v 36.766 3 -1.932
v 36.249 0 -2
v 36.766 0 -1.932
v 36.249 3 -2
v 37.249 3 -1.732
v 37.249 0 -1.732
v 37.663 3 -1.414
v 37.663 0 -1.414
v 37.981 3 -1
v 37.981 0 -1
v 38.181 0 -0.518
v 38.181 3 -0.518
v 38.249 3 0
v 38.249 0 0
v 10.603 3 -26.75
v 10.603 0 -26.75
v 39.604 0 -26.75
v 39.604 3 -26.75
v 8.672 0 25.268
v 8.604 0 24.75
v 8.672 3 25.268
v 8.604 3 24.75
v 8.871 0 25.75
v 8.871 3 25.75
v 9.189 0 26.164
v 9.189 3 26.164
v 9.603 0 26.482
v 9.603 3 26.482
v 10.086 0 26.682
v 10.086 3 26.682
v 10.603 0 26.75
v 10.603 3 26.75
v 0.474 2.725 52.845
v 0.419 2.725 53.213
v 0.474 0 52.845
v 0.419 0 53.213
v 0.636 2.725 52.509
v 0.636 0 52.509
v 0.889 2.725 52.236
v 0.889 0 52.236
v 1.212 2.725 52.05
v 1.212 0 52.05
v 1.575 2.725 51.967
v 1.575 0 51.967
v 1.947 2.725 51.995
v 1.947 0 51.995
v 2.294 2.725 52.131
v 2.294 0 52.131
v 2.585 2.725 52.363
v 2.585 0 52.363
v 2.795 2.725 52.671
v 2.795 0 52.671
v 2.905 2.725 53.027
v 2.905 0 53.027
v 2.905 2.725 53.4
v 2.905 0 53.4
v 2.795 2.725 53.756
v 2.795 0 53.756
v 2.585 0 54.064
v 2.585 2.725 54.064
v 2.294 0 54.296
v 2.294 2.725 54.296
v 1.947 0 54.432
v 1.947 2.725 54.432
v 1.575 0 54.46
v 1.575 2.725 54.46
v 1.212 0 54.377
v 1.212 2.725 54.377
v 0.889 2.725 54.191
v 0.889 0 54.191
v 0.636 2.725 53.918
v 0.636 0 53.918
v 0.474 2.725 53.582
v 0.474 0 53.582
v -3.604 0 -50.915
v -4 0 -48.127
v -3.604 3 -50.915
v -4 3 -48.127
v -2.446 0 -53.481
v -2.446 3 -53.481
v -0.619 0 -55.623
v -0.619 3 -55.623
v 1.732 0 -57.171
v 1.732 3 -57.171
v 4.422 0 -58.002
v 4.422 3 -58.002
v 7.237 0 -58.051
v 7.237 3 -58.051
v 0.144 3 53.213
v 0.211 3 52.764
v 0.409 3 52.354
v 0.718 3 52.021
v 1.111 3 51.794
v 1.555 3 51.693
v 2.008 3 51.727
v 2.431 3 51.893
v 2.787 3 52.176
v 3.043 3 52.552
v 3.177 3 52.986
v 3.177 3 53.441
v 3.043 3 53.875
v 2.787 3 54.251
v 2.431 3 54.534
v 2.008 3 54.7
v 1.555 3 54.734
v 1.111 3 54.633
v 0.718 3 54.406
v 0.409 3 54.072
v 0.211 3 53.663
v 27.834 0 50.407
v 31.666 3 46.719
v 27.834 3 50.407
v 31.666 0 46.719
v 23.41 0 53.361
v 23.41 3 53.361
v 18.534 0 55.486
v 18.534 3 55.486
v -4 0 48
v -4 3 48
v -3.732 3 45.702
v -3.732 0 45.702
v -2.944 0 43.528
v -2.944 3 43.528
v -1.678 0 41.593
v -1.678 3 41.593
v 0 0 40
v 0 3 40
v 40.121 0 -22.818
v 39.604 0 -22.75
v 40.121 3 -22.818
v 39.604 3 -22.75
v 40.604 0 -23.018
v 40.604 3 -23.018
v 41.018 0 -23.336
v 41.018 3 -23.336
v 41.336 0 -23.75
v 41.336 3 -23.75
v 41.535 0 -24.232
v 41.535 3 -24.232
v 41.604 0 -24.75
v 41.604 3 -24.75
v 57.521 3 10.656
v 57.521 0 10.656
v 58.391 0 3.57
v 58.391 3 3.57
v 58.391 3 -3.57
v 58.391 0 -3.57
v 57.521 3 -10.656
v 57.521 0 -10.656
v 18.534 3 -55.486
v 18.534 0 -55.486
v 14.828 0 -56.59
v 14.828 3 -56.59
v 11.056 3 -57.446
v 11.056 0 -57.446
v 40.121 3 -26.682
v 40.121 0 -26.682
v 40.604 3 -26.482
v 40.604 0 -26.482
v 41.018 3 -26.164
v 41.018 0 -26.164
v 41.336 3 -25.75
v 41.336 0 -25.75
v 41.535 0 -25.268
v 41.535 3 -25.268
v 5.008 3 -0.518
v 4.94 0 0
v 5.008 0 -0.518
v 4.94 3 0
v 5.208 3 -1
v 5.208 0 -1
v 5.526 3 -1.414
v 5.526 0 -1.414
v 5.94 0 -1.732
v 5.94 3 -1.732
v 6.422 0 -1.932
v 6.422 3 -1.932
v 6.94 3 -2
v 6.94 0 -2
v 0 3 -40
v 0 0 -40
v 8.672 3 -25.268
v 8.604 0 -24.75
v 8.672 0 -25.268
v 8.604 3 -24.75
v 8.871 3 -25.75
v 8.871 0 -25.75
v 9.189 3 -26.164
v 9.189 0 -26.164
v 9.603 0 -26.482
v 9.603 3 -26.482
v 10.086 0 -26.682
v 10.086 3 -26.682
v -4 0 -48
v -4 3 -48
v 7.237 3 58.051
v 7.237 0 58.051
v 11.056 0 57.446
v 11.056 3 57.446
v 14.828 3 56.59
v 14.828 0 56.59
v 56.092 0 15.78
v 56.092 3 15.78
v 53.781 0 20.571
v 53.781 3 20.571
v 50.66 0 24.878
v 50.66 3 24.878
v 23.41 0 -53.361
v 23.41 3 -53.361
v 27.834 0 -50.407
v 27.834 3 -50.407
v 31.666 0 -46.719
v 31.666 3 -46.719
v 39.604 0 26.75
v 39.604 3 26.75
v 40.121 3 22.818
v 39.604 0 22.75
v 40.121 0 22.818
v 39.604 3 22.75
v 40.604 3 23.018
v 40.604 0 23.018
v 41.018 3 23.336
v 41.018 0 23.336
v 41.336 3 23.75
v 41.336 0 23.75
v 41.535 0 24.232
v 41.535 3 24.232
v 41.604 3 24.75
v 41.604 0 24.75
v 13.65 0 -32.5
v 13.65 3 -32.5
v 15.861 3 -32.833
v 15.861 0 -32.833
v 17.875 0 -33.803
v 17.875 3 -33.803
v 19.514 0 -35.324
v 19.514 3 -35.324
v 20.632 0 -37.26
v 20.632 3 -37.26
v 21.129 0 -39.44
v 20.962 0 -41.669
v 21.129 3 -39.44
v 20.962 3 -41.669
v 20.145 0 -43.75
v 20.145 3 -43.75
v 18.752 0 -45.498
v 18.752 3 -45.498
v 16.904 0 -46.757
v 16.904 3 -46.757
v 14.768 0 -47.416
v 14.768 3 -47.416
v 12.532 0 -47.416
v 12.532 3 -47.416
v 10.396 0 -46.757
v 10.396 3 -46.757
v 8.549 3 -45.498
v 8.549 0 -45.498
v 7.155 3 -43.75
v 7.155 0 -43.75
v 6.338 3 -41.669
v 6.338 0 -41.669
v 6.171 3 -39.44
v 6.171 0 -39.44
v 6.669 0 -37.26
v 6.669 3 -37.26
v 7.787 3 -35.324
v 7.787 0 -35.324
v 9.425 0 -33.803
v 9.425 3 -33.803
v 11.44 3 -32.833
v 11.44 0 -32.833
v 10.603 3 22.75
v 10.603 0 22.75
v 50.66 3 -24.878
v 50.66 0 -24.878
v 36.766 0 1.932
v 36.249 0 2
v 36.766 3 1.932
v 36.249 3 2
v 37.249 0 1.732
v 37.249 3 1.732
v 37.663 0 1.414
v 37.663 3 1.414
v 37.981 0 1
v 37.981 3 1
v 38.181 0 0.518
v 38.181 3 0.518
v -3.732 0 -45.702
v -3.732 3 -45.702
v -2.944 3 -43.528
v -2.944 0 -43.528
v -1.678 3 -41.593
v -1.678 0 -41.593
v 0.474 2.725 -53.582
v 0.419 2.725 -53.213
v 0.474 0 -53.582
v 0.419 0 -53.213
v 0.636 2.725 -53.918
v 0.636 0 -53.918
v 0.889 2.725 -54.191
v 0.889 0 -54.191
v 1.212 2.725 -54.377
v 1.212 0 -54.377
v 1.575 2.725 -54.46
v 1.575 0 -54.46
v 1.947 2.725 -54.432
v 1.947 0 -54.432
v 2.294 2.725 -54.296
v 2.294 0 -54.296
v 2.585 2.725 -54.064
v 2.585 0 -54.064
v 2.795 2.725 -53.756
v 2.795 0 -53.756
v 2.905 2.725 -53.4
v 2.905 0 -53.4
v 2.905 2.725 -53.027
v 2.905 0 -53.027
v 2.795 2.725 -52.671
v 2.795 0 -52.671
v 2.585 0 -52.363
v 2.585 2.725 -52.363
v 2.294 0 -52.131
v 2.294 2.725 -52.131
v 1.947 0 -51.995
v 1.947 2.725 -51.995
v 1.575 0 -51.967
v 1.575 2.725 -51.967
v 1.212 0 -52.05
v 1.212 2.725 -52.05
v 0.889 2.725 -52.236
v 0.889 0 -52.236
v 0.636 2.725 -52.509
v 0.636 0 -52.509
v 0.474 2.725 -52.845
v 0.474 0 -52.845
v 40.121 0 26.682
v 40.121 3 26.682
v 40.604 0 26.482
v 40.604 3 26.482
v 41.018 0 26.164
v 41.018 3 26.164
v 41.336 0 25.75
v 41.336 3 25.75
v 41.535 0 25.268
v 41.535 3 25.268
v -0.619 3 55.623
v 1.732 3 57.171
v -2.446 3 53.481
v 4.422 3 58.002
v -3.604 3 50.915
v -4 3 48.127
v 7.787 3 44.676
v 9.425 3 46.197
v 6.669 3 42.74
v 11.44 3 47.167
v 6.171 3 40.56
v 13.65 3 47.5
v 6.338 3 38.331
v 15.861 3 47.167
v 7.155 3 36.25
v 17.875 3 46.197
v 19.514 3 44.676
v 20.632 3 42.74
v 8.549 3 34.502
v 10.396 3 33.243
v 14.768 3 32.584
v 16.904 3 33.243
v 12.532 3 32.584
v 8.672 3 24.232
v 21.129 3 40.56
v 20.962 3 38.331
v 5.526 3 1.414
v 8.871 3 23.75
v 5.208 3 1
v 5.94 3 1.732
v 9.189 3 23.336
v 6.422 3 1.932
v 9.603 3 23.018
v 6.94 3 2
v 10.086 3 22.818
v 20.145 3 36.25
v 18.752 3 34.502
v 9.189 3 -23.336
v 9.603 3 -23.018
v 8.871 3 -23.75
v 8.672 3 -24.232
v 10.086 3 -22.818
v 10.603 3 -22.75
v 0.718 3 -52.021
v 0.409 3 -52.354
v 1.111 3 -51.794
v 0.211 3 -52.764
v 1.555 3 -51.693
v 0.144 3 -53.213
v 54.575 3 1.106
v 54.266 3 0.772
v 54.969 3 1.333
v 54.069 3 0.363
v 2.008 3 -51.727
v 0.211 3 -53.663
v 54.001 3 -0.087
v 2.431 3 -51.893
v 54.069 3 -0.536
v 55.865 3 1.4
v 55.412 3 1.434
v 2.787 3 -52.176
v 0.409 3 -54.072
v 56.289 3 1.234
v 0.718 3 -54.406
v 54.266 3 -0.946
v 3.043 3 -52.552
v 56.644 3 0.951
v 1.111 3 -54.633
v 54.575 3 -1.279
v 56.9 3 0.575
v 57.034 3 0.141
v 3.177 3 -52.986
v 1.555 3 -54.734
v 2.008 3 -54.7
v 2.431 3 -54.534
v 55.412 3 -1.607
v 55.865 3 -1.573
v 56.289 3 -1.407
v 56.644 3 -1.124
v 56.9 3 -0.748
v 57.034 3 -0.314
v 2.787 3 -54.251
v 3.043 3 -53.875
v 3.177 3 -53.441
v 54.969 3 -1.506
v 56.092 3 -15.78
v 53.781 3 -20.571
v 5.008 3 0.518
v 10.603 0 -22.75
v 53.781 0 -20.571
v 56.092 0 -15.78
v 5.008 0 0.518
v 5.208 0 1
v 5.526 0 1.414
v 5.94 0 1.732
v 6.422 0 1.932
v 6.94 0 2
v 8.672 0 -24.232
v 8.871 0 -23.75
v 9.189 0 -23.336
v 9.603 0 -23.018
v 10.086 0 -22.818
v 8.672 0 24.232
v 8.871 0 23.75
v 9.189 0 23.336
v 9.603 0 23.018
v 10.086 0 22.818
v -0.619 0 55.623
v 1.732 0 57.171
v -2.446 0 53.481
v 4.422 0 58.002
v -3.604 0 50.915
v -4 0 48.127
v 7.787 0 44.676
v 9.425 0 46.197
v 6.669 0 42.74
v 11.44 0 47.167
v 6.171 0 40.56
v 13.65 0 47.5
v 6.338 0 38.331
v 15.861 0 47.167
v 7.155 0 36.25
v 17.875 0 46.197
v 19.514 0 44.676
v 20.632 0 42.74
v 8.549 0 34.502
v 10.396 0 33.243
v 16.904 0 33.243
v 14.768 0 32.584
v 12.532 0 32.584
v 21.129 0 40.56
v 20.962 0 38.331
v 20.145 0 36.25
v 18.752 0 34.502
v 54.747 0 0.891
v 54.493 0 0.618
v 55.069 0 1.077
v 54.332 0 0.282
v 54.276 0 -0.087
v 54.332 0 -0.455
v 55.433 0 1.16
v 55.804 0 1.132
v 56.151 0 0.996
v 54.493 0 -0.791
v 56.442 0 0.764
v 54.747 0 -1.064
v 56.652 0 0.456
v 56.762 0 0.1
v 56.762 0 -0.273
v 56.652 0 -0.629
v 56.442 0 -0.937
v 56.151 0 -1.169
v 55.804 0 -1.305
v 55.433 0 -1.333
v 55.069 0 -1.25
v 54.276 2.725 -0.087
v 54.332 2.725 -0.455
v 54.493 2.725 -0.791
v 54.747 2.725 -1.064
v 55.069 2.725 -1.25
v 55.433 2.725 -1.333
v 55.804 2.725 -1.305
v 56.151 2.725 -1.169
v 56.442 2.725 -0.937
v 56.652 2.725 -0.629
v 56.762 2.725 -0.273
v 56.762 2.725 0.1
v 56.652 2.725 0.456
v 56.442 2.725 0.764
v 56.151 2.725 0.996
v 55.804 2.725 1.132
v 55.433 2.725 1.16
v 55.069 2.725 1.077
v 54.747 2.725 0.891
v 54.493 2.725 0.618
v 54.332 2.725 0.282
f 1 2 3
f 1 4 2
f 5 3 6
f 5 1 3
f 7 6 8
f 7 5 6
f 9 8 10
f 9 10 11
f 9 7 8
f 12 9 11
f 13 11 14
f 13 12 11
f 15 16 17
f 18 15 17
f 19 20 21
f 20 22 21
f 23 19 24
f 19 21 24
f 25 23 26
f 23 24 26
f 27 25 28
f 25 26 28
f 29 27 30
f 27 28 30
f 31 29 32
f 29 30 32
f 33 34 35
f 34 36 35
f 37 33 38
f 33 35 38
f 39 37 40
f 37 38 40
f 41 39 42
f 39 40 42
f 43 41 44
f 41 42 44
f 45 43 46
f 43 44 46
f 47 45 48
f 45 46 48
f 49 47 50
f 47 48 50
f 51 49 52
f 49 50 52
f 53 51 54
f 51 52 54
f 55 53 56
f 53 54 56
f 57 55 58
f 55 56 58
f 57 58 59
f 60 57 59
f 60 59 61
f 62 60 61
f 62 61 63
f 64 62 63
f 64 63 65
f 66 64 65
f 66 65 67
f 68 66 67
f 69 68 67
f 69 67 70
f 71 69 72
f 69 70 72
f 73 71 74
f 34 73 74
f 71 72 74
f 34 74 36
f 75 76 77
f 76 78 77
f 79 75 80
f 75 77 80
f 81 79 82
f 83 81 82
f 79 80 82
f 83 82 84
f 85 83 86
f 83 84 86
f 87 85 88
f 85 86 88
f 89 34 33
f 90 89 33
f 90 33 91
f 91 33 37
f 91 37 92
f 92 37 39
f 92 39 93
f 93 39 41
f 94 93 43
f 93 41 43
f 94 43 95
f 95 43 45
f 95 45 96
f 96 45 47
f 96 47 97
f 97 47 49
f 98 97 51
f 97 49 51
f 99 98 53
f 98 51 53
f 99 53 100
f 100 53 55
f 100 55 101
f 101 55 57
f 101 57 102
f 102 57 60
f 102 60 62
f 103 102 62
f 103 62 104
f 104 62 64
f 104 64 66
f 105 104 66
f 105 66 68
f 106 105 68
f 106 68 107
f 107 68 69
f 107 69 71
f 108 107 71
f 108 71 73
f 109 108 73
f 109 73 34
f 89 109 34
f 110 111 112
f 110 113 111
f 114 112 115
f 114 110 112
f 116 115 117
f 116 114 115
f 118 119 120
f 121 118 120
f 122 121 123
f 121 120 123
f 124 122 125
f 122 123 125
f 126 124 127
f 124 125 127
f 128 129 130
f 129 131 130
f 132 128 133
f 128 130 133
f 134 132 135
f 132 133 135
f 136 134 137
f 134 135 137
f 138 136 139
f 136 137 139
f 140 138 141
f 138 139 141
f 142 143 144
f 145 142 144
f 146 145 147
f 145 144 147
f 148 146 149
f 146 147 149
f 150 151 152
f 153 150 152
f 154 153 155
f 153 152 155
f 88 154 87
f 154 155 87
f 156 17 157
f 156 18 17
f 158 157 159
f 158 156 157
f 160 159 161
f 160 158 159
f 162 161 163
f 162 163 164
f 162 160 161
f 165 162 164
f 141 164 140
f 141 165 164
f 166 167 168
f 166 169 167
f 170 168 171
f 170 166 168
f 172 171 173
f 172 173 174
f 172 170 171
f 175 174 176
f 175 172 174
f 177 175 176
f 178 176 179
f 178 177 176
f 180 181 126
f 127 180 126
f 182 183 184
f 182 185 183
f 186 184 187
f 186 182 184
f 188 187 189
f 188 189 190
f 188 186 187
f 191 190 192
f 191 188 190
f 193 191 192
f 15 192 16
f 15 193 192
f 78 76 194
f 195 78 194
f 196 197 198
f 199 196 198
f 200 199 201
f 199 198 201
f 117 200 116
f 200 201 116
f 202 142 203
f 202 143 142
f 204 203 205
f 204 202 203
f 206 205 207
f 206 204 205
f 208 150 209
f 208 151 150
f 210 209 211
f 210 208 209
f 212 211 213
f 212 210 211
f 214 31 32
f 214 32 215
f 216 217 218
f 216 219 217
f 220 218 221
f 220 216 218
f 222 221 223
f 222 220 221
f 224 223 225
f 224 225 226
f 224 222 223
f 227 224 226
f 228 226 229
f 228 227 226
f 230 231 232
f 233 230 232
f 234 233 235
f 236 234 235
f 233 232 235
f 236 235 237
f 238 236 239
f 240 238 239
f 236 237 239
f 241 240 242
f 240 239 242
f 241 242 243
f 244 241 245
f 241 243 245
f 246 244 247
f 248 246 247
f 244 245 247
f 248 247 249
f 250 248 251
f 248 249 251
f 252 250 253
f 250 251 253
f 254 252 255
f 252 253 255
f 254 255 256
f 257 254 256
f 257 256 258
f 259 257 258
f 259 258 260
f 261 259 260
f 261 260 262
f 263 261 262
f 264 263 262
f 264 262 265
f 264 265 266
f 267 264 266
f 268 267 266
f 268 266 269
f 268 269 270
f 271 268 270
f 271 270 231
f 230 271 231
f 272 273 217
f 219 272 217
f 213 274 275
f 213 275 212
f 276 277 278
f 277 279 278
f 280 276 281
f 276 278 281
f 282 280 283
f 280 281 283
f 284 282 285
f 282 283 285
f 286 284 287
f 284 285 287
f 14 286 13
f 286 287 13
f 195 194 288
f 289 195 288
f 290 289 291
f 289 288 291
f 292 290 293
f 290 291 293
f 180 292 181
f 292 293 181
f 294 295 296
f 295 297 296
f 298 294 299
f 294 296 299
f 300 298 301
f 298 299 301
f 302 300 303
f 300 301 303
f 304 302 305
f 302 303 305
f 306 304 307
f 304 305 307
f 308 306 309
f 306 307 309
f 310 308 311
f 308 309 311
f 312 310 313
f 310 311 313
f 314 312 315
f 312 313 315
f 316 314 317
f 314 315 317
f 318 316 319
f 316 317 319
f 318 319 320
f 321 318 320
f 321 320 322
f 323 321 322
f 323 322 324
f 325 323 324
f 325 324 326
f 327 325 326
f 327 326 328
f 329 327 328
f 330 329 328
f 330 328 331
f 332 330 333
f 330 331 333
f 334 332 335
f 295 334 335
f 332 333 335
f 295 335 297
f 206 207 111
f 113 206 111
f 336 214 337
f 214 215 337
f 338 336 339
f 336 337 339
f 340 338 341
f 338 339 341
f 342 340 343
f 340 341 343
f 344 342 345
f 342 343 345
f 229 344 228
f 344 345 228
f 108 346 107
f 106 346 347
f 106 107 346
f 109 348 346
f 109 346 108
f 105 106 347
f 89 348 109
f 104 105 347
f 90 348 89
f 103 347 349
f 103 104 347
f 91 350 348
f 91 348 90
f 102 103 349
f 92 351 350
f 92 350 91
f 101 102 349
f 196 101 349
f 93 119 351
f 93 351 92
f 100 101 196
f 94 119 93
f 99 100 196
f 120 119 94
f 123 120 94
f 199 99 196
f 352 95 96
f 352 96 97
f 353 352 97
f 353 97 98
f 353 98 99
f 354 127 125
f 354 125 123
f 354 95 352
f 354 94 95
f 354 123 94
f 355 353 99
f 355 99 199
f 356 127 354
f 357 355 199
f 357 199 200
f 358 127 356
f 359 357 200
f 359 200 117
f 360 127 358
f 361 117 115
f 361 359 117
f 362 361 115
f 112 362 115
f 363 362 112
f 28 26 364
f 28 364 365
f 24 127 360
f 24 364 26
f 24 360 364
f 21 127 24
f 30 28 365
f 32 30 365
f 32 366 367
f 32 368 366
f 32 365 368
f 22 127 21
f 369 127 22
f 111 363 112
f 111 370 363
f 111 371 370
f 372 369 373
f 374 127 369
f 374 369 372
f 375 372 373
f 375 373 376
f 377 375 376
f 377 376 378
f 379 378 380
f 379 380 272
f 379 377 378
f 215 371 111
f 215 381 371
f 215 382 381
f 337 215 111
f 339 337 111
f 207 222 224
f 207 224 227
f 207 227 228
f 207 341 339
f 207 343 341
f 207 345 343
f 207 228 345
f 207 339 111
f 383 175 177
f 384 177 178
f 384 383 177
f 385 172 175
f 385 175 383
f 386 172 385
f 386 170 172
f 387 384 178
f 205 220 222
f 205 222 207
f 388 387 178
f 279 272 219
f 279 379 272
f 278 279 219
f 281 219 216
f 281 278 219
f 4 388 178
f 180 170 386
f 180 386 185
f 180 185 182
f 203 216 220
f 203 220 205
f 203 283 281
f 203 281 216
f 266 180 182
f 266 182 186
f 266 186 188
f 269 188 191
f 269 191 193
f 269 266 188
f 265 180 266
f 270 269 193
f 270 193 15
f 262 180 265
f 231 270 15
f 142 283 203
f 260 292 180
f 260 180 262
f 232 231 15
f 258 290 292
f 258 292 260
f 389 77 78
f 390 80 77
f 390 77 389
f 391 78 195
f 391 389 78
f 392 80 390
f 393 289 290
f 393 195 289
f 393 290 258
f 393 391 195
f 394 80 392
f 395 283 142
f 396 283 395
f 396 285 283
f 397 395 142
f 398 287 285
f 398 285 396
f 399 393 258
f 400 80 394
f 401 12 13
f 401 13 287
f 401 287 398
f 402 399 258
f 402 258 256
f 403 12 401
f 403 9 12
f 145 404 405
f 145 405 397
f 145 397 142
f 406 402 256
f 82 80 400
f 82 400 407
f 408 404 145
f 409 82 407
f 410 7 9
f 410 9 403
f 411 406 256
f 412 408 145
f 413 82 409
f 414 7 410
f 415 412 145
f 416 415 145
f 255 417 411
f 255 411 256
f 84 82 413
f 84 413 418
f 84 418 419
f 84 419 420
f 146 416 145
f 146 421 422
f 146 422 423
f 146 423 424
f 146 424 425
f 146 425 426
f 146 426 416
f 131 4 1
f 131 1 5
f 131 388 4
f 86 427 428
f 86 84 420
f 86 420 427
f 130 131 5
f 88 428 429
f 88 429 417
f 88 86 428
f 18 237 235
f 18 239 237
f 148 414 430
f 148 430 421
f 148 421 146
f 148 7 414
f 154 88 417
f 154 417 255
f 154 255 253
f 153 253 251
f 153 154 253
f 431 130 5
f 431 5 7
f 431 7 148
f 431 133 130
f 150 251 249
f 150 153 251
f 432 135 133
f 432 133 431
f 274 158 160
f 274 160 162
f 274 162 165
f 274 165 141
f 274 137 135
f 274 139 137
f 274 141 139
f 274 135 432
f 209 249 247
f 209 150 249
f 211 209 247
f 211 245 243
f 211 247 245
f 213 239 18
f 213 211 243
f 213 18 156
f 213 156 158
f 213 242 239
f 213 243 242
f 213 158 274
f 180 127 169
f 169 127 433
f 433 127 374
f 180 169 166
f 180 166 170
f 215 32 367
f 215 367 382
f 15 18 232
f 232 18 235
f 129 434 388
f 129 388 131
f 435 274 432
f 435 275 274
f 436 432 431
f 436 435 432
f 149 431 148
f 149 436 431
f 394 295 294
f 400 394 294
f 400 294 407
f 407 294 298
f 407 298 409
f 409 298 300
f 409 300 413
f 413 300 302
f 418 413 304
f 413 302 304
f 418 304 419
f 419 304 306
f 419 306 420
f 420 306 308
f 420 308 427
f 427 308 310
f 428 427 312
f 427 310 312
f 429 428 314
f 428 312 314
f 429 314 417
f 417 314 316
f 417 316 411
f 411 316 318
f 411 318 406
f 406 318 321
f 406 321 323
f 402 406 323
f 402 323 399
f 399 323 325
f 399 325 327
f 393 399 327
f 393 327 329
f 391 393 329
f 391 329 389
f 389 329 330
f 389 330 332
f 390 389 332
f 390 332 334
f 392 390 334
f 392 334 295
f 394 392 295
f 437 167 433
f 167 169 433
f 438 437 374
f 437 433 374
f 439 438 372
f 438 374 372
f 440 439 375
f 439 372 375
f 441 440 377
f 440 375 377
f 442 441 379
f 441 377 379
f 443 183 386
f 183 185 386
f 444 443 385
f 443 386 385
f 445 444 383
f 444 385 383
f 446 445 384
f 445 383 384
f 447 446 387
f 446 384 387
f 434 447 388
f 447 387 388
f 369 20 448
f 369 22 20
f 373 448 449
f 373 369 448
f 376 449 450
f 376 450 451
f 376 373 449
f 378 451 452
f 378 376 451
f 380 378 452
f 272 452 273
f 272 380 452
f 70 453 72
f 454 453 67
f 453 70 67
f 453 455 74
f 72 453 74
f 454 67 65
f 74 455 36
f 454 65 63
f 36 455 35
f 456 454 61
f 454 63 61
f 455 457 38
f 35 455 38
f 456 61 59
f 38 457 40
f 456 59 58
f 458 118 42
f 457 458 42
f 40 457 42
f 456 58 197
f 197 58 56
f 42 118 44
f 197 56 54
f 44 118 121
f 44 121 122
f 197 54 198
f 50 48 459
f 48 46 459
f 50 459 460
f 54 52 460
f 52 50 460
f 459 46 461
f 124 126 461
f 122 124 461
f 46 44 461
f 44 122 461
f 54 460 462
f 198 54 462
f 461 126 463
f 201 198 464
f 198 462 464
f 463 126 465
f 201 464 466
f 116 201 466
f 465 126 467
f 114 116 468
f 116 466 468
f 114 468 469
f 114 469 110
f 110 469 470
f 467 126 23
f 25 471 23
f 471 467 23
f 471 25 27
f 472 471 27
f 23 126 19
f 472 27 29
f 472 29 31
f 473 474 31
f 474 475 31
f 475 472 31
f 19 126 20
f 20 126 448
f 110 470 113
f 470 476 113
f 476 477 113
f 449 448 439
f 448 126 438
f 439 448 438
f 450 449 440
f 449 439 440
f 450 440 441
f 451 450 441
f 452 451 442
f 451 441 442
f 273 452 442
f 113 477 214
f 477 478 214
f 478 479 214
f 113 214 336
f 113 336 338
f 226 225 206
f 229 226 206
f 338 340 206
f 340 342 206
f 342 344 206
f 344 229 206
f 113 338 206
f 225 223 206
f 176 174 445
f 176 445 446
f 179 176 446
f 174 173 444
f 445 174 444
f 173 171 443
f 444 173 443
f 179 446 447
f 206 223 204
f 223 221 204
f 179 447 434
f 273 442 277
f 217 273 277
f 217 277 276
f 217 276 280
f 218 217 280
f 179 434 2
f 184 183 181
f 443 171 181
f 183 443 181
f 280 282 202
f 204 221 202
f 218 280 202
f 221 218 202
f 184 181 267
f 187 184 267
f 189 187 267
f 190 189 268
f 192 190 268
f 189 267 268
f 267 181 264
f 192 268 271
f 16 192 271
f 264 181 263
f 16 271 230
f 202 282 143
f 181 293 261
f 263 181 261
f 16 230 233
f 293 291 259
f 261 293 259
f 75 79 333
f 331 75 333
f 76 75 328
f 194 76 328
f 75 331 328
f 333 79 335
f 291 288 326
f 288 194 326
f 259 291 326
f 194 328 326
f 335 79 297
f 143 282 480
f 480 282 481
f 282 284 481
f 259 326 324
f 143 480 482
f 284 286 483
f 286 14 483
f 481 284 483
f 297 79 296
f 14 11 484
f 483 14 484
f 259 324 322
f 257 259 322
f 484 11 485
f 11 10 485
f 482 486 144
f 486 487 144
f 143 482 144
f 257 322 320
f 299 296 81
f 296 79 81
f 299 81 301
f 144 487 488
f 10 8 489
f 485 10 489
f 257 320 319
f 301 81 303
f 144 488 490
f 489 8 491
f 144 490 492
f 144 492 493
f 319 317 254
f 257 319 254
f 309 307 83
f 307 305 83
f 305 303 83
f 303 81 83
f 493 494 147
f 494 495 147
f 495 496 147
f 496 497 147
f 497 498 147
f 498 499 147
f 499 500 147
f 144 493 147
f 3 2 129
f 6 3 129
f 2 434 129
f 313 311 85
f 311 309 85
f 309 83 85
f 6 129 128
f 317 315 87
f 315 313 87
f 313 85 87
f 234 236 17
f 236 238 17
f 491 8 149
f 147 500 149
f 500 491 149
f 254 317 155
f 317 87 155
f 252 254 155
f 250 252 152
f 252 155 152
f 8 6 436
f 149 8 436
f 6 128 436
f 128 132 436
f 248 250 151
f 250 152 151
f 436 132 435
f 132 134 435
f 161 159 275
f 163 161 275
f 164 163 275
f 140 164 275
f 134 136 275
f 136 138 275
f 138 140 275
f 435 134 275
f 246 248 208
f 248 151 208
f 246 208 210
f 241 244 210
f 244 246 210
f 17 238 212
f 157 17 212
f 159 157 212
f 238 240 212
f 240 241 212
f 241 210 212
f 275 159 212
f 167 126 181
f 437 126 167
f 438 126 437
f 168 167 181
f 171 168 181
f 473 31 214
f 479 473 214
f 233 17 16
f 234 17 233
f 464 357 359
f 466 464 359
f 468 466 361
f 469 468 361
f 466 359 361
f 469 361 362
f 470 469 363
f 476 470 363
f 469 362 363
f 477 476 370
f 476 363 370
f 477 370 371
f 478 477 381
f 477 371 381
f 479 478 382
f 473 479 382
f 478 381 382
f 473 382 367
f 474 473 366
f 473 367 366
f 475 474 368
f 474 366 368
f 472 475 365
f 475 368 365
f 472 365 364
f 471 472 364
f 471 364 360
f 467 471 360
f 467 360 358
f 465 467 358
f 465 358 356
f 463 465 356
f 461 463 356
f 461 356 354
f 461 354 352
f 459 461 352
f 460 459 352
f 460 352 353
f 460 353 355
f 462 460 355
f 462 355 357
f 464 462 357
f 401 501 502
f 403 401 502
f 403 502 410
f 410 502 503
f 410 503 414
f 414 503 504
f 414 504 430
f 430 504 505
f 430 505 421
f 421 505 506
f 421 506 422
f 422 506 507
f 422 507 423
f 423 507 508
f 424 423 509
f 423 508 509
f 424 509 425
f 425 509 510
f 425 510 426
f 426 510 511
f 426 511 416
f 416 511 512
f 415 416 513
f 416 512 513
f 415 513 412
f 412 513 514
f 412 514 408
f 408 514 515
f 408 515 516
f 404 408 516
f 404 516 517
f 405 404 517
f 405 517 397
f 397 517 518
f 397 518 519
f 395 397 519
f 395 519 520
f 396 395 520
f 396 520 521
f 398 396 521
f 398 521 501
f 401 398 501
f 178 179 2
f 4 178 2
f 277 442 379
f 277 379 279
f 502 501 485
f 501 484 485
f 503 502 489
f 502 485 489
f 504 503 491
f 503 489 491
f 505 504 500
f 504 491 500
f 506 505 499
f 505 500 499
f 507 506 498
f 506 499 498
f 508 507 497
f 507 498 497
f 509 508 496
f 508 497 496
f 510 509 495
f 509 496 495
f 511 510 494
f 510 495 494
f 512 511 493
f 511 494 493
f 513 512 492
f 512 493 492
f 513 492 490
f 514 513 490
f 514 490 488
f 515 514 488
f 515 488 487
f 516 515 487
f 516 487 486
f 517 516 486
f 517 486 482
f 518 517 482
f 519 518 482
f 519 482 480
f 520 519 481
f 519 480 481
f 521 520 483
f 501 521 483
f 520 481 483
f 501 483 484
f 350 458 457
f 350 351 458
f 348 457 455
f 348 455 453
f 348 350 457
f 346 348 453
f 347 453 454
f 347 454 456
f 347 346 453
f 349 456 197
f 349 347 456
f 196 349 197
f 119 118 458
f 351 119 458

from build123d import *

# Parameters (mm, degrees)
EXTRUDE_1_DEPTH              = 3
FILLET_1_R                   = 10
SKETCH_2_W                   = 33
SKETCH_2_H                   = 4
SKETCH_2_W_2                 = 33.308993126
CUT_EXTRUDE_1_DEPTH          = 83.523019213
SKETCH_3_W                   = 8
SKETCH_3_H                   = 80
CUT_EXTRUDE_2_DEPTH          = 83.523019213
FILLET_2_R                   = 10
FILLET_3_R                   = 2
CUT_EXTRUDE_3_DEPTH          = 83.523019213
FILLET_4_R                   = 30
SKETCH_5_R                   = 7.5
CUT_EXTRUDE_4_DEPTH          = 83.523019213
HOLE_WIZARD_M3_1_D           = 2.5
HOLE_WIZARD_M3_1_DEPTH       = 3
HOLE_WIZARD_M3_1_CSINK_D     = 3.05
HOLE_WIZARD_M3_1_CSINK_ANGLE = 90
HOLE_WIZARD_M3_1_TIP         = 0.751075774


# Some blends are built 0.0001 mm under size
with BuildPart() as part:
    # 草图1 → 凸台-拉伸1 (new body)
    with BuildSketch(Plane(origin=(0, 0, 0), x_dir=(1, 0, 0), z_dir=(0, 1, 0))):
        with BuildLine():
            Line((-4, 58.36308765), (-4, -58.36308765))
            ThreePointArc((-4, -58.36308765), (58.5, 0), (-4, 58.36308765))
        make_face()
    extrude(amount=EXTRUDE_1_DEPTH)

    # 圆角1
    fillet_1_edges = [part.edges().sort_by_distance(p)[0] for p in [
        (-4, 1.5, 58.36308765),
        (-4, 1.5, -58.36308765),
    ]]
    fillet(fillet_1_edges, radius=FILLET_1_R)

    # 草图2 → 切除-拉伸1 (cut, through all)
    with BuildSketch(Plane.XZ):
        with Locations((25.103538951, 24.75)):
            Rectangle(SKETCH_2_W, SKETCH_2_H)
        with Locations((25.103538951, -24.75)):
            Rectangle(SKETCH_2_W, SKETCH_2_H)
        with Locations((21.59426648, 0)):
            Rectangle(SKETCH_2_W_2, SKETCH_2_H)
    extrude(amount=-CUT_EXTRUDE_1_DEPTH, mode=Mode.SUBTRACT)

    # 草图3 → 切除-拉伸2 (cut, through all)
    with BuildSketch(Plane.XZ):
        with Locations((-4, 0)):
            Rectangle(SKETCH_3_W, SKETCH_3_H)
    extrude(amount=-CUT_EXTRUDE_2_DEPTH, mode=Mode.SUBTRACT)

    # 圆角2
    # the kernel refuses this fillet: 10 mm, written as the material it takes off along each edge
    with BuildSketch(Plane(origin=(-4, 23, 40), x_dir=(0, 0, 1), z_dir=(0, -1, 0)), Plane(origin=(-4, -20, -40), x_dir=(0, 0, -1), z_dir=(0, 1, 0))) as fillet_2_piece_1:
        with BuildLine():
            CenterArc((8, -10), FILLET_2_R, 90, 53.130102354)
            Line((0, -4), (-0.16, -3.88))
            ThreePointArc((-0.16, -3.88), (-0.2, -2), (-0.2, 0))
            Line((-0.2, 0), (0, 0.2))
            Line((0, 0.2), (8, 0.2))
            Line((8, 0.2), (8, 0))
        make_face()
    extrude(amount=43, mode=Mode.SUBTRACT)

    # 圆角3
    fillet_3_edges = [part.edges().sort_by_distance(p)[0] for p in [
        (8.603538951, 1.5, -26.75),
        (8.603538951, 1.5, -22.75),
        (41.603538951, 1.5, -26.75),
        (41.603538951, 1.5, -22.75),
        (4.939769917, 1.5, 2),
        (38.248763043, 1.5, 2),
        (38.248763043, 1.5, -2),
        (4.939769917, 1.5, -2),
        (41.603538951, 1.5, 22.75),
        (41.603538951, 1.5, 26.75),
        (8.603538951, 1.5, 22.75),
        (8.603538951, 1.5, 26.75),
    ]]
    fillet(fillet_3_edges, radius=FILLET_3_R - 0.0001)  # a hair under: the kernel refuses the full size

    # 草图4 → 切除-拉伸3 (cut, through all)
    with BuildSketch(Plane(origin=(0, 3, 0), x_dir=(1, 0, 0), z_dir=(0, 1, 0))):
        with BuildLine():
            Line((55.026651821, -19.857431591), (27.299740921, -51.73948343))
            ThreePointArc((27.299740921, -51.73948343), (44.142100571, -38.389125506), (55.026651821, -19.857431591))
        make_face()
        with BuildLine():
            Line((55.026651821, 19.857431591), (27.299740921, 51.73948343))
            ThreePointArc((27.299740921, 51.73948343), (44.142100571, 38.389125506), (55.026651821, 19.857431591))
        make_face()
    extrude(amount=-CUT_EXTRUDE_3_DEPTH, mode=Mode.SUBTRACT)

    # 圆角4
    fillet_4_edges = [part.edges().sort_by_distance(p)[0] for p in [
        (55.026651821, 1.5, 19.857431591),
        (27.299740921, 1.5, 51.73948343),
        (27.299740921, 1.5, -51.73948343),
        (55.026651821, 1.5, -19.857431591),
    ]]
    fillet(fillet_4_edges, radius=FILLET_4_R)

    # 草图5 → 切除-拉伸4 (cut, through all)
    with BuildSketch(Plane(origin=(0, 3, 0), x_dir=(1, 0, 0), z_dir=(0, 1, 0))):
        with Locations(Location((13.650269614, 40, 0), (0, 0, 270))):
            Circle(SKETCH_5_R)
        with Locations(Location((13.650269614, -40, 0), (0, 0, 270))):
            Circle(SKETCH_5_R)
    extrude(amount=-CUT_EXTRUDE_4_DEPTH, mode=Mode.SUBTRACT)

    # M3 螺纹孔1
    with Locations(Plane(origin=(0, 3, 0), x_dir=(1, 0, 0), z_dir=(0, 1, 0))):
        with Locations((1.668639438, 53.213363577), (1.668639438, -53.213363577), (0.79229906, -68.463573452), (55.526064592, 0.086594156)):
            CounterSinkHole(HOLE_WIZARD_M3_1_D / 2, HOLE_WIZARD_M3_1_CSINK_D / 2, depth=HOLE_WIZARD_M3_1_DEPTH, counter_sink_angle=HOLE_WIZARD_M3_1_CSINK_ANGLE)
            with Locations((0, 0, -(HOLE_WIZARD_M3_1_DEPTH + HOLE_WIZARD_M3_1_TIP / 2))):  # 118° drill point
                Cone(0, HOLE_WIZARD_M3_1_D / 2, HOLE_WIZARD_M3_1_TIP, mode=Mode.SUBTRACT)


solid = part.part
